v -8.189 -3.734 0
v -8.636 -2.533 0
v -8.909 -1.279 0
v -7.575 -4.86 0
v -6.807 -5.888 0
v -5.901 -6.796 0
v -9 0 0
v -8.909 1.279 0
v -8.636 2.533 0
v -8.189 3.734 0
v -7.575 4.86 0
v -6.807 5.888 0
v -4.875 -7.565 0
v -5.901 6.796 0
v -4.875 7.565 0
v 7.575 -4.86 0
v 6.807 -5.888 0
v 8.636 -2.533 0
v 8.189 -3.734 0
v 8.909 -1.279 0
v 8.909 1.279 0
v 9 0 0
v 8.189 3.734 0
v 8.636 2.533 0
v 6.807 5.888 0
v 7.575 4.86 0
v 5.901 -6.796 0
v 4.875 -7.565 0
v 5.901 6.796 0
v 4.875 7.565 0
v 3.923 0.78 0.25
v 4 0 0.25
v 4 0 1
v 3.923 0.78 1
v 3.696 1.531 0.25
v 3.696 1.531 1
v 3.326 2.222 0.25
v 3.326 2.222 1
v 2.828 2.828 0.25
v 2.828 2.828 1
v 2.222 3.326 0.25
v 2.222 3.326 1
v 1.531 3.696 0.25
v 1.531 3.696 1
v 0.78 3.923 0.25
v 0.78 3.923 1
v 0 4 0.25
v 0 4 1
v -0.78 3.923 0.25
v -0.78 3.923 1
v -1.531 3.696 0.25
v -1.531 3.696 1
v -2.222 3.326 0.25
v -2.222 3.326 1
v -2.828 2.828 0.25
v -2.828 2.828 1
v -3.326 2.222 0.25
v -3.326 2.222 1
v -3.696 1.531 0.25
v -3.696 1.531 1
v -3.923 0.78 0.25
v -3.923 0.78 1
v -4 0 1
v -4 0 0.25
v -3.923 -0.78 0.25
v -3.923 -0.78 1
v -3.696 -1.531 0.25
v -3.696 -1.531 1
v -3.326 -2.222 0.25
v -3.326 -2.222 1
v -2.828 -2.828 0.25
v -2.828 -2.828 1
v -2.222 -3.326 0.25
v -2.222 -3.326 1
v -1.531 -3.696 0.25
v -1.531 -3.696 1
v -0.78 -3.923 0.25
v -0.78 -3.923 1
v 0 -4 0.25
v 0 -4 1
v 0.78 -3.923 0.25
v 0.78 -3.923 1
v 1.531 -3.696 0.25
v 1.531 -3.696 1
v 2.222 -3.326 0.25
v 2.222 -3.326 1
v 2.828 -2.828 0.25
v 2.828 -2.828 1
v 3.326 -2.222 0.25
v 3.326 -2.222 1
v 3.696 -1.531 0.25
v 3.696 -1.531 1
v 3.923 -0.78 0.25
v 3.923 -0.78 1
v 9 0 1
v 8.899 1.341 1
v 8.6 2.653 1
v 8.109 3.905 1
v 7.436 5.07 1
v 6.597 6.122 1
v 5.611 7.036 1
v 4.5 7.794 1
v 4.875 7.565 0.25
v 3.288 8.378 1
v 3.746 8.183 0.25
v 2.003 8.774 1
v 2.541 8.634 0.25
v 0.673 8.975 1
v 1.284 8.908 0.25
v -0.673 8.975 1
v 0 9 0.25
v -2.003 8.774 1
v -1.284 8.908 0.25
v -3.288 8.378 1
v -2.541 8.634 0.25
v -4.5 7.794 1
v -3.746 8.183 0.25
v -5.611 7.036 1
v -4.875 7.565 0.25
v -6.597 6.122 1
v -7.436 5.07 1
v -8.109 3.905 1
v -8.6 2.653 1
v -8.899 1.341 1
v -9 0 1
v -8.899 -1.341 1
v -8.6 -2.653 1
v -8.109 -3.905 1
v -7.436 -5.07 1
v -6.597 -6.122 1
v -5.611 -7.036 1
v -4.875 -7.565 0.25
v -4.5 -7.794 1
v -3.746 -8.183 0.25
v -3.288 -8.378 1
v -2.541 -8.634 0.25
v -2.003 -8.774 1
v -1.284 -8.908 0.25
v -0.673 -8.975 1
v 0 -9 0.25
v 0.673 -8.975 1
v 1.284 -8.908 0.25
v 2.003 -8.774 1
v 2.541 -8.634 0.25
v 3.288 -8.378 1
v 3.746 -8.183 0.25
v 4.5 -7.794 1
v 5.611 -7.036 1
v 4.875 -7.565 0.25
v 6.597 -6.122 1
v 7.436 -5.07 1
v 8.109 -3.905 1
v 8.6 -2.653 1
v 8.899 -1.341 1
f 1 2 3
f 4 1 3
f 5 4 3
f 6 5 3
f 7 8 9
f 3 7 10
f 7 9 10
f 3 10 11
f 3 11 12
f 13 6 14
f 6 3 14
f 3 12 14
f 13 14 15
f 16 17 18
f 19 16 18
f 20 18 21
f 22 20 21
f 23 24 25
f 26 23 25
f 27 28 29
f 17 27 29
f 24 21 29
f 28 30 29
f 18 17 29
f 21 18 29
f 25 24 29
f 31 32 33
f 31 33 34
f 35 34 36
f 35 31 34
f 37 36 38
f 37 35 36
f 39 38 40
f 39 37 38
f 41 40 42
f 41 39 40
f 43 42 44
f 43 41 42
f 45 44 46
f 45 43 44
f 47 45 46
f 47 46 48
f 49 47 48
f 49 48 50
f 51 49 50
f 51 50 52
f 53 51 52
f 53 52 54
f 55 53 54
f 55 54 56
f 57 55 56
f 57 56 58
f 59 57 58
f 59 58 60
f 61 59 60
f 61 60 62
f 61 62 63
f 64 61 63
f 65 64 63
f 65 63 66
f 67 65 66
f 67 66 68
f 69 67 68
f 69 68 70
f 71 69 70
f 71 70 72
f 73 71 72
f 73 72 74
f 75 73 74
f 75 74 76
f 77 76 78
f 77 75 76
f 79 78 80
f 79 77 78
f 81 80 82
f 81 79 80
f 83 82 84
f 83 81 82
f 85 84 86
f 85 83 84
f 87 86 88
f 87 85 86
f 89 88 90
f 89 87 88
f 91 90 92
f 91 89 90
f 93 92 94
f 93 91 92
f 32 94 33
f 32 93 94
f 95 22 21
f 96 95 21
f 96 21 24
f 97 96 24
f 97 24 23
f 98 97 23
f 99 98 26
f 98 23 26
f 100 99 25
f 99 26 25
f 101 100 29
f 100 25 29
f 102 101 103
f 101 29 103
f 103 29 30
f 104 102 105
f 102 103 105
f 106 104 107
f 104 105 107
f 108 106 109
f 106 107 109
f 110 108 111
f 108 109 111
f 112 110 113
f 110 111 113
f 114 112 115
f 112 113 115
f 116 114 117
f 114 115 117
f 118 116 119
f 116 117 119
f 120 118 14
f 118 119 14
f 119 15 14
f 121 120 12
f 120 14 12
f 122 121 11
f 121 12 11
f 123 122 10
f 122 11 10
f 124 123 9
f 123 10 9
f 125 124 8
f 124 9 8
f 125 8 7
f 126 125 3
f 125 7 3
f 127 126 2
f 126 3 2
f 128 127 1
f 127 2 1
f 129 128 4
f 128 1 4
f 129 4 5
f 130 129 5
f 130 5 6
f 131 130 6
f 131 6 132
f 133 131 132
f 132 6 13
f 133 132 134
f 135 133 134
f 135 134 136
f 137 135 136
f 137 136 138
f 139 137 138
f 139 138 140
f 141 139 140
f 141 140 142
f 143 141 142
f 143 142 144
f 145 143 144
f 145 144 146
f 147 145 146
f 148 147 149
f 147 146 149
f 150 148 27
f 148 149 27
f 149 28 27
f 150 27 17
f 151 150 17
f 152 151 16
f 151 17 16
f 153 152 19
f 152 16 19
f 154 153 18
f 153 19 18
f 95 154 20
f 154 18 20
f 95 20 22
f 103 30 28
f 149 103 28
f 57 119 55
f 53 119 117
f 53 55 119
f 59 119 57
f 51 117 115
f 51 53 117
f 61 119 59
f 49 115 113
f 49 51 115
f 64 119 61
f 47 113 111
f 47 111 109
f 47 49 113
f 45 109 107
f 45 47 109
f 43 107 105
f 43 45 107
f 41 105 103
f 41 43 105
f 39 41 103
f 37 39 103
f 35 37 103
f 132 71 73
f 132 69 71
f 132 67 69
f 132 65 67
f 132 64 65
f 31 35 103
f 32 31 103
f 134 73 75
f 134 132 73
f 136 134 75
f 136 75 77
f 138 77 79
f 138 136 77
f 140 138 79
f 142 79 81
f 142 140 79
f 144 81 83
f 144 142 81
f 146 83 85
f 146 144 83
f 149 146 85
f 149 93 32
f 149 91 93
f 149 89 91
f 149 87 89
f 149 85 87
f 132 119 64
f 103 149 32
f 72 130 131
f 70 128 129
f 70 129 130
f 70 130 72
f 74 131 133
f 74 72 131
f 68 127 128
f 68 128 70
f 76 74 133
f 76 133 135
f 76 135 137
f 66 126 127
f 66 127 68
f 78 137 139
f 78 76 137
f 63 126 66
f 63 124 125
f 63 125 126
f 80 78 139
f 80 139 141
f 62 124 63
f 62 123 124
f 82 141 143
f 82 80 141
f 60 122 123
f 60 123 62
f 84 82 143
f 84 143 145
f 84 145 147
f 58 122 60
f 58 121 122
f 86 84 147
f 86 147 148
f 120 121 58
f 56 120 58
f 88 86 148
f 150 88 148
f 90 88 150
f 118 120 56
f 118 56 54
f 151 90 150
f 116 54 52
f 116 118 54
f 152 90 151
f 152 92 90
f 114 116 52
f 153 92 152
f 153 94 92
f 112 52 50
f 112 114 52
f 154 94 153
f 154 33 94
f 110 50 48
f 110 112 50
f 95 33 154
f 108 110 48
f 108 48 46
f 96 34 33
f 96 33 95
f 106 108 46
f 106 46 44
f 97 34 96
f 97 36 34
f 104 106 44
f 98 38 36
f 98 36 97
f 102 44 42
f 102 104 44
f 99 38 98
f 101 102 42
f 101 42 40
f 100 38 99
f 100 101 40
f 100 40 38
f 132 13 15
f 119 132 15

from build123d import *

# Parameters (mm, degrees)
F0_R     = 9
F0_R_2   = 4
F1_DEPTH = 1
F2_R     = 4
F3_DEPTH = 0.25


with BuildPart() as f1:
    # F0 (on Top) → F1 (new body)
    with BuildSketch(Plane.XY):
        Circle(F0_R)
        Circle(F0_R_2, mode=Mode.SUBTRACT)
    extrude(amount=F1_DEPTH)

    # F2 (on face) → F3 (cut)
    with BuildSketch(Plane(origin=(0, 0, 0), x_dir=(1, 0, 0), z_dir=(0, 0, -1))):
        with BuildLine():
            ThreePointArc((4.875, 7.5653403757), (2.5408597579, 8.6338885614), (0, 9))
            ThreePointArc((0, 9), (-2.5408597579, 8.6338885614), (-4.875, 7.5653403757))
            Line((-4.875, 7.5653403757), (-4.875, -7.5653403757))
            ThreePointArc((-4.875, -7.5653403757), (-2.5408597579, -8.6338885614), (0, -9))
            ThreePointArc((0, -9), (2.5408597579, -8.6338885614), (4.875, -7.5653403757))
            Line((4.875, -7.5653403757), (4.875, 7.5653403757))
        make_face()
        Circle(F2_R, mode=Mode.SUBTRACT)
        Circle(F2_R)
    extrude(amount=-F3_DEPTH, mode=Mode.SUBTRACT)


solid = f1.part
